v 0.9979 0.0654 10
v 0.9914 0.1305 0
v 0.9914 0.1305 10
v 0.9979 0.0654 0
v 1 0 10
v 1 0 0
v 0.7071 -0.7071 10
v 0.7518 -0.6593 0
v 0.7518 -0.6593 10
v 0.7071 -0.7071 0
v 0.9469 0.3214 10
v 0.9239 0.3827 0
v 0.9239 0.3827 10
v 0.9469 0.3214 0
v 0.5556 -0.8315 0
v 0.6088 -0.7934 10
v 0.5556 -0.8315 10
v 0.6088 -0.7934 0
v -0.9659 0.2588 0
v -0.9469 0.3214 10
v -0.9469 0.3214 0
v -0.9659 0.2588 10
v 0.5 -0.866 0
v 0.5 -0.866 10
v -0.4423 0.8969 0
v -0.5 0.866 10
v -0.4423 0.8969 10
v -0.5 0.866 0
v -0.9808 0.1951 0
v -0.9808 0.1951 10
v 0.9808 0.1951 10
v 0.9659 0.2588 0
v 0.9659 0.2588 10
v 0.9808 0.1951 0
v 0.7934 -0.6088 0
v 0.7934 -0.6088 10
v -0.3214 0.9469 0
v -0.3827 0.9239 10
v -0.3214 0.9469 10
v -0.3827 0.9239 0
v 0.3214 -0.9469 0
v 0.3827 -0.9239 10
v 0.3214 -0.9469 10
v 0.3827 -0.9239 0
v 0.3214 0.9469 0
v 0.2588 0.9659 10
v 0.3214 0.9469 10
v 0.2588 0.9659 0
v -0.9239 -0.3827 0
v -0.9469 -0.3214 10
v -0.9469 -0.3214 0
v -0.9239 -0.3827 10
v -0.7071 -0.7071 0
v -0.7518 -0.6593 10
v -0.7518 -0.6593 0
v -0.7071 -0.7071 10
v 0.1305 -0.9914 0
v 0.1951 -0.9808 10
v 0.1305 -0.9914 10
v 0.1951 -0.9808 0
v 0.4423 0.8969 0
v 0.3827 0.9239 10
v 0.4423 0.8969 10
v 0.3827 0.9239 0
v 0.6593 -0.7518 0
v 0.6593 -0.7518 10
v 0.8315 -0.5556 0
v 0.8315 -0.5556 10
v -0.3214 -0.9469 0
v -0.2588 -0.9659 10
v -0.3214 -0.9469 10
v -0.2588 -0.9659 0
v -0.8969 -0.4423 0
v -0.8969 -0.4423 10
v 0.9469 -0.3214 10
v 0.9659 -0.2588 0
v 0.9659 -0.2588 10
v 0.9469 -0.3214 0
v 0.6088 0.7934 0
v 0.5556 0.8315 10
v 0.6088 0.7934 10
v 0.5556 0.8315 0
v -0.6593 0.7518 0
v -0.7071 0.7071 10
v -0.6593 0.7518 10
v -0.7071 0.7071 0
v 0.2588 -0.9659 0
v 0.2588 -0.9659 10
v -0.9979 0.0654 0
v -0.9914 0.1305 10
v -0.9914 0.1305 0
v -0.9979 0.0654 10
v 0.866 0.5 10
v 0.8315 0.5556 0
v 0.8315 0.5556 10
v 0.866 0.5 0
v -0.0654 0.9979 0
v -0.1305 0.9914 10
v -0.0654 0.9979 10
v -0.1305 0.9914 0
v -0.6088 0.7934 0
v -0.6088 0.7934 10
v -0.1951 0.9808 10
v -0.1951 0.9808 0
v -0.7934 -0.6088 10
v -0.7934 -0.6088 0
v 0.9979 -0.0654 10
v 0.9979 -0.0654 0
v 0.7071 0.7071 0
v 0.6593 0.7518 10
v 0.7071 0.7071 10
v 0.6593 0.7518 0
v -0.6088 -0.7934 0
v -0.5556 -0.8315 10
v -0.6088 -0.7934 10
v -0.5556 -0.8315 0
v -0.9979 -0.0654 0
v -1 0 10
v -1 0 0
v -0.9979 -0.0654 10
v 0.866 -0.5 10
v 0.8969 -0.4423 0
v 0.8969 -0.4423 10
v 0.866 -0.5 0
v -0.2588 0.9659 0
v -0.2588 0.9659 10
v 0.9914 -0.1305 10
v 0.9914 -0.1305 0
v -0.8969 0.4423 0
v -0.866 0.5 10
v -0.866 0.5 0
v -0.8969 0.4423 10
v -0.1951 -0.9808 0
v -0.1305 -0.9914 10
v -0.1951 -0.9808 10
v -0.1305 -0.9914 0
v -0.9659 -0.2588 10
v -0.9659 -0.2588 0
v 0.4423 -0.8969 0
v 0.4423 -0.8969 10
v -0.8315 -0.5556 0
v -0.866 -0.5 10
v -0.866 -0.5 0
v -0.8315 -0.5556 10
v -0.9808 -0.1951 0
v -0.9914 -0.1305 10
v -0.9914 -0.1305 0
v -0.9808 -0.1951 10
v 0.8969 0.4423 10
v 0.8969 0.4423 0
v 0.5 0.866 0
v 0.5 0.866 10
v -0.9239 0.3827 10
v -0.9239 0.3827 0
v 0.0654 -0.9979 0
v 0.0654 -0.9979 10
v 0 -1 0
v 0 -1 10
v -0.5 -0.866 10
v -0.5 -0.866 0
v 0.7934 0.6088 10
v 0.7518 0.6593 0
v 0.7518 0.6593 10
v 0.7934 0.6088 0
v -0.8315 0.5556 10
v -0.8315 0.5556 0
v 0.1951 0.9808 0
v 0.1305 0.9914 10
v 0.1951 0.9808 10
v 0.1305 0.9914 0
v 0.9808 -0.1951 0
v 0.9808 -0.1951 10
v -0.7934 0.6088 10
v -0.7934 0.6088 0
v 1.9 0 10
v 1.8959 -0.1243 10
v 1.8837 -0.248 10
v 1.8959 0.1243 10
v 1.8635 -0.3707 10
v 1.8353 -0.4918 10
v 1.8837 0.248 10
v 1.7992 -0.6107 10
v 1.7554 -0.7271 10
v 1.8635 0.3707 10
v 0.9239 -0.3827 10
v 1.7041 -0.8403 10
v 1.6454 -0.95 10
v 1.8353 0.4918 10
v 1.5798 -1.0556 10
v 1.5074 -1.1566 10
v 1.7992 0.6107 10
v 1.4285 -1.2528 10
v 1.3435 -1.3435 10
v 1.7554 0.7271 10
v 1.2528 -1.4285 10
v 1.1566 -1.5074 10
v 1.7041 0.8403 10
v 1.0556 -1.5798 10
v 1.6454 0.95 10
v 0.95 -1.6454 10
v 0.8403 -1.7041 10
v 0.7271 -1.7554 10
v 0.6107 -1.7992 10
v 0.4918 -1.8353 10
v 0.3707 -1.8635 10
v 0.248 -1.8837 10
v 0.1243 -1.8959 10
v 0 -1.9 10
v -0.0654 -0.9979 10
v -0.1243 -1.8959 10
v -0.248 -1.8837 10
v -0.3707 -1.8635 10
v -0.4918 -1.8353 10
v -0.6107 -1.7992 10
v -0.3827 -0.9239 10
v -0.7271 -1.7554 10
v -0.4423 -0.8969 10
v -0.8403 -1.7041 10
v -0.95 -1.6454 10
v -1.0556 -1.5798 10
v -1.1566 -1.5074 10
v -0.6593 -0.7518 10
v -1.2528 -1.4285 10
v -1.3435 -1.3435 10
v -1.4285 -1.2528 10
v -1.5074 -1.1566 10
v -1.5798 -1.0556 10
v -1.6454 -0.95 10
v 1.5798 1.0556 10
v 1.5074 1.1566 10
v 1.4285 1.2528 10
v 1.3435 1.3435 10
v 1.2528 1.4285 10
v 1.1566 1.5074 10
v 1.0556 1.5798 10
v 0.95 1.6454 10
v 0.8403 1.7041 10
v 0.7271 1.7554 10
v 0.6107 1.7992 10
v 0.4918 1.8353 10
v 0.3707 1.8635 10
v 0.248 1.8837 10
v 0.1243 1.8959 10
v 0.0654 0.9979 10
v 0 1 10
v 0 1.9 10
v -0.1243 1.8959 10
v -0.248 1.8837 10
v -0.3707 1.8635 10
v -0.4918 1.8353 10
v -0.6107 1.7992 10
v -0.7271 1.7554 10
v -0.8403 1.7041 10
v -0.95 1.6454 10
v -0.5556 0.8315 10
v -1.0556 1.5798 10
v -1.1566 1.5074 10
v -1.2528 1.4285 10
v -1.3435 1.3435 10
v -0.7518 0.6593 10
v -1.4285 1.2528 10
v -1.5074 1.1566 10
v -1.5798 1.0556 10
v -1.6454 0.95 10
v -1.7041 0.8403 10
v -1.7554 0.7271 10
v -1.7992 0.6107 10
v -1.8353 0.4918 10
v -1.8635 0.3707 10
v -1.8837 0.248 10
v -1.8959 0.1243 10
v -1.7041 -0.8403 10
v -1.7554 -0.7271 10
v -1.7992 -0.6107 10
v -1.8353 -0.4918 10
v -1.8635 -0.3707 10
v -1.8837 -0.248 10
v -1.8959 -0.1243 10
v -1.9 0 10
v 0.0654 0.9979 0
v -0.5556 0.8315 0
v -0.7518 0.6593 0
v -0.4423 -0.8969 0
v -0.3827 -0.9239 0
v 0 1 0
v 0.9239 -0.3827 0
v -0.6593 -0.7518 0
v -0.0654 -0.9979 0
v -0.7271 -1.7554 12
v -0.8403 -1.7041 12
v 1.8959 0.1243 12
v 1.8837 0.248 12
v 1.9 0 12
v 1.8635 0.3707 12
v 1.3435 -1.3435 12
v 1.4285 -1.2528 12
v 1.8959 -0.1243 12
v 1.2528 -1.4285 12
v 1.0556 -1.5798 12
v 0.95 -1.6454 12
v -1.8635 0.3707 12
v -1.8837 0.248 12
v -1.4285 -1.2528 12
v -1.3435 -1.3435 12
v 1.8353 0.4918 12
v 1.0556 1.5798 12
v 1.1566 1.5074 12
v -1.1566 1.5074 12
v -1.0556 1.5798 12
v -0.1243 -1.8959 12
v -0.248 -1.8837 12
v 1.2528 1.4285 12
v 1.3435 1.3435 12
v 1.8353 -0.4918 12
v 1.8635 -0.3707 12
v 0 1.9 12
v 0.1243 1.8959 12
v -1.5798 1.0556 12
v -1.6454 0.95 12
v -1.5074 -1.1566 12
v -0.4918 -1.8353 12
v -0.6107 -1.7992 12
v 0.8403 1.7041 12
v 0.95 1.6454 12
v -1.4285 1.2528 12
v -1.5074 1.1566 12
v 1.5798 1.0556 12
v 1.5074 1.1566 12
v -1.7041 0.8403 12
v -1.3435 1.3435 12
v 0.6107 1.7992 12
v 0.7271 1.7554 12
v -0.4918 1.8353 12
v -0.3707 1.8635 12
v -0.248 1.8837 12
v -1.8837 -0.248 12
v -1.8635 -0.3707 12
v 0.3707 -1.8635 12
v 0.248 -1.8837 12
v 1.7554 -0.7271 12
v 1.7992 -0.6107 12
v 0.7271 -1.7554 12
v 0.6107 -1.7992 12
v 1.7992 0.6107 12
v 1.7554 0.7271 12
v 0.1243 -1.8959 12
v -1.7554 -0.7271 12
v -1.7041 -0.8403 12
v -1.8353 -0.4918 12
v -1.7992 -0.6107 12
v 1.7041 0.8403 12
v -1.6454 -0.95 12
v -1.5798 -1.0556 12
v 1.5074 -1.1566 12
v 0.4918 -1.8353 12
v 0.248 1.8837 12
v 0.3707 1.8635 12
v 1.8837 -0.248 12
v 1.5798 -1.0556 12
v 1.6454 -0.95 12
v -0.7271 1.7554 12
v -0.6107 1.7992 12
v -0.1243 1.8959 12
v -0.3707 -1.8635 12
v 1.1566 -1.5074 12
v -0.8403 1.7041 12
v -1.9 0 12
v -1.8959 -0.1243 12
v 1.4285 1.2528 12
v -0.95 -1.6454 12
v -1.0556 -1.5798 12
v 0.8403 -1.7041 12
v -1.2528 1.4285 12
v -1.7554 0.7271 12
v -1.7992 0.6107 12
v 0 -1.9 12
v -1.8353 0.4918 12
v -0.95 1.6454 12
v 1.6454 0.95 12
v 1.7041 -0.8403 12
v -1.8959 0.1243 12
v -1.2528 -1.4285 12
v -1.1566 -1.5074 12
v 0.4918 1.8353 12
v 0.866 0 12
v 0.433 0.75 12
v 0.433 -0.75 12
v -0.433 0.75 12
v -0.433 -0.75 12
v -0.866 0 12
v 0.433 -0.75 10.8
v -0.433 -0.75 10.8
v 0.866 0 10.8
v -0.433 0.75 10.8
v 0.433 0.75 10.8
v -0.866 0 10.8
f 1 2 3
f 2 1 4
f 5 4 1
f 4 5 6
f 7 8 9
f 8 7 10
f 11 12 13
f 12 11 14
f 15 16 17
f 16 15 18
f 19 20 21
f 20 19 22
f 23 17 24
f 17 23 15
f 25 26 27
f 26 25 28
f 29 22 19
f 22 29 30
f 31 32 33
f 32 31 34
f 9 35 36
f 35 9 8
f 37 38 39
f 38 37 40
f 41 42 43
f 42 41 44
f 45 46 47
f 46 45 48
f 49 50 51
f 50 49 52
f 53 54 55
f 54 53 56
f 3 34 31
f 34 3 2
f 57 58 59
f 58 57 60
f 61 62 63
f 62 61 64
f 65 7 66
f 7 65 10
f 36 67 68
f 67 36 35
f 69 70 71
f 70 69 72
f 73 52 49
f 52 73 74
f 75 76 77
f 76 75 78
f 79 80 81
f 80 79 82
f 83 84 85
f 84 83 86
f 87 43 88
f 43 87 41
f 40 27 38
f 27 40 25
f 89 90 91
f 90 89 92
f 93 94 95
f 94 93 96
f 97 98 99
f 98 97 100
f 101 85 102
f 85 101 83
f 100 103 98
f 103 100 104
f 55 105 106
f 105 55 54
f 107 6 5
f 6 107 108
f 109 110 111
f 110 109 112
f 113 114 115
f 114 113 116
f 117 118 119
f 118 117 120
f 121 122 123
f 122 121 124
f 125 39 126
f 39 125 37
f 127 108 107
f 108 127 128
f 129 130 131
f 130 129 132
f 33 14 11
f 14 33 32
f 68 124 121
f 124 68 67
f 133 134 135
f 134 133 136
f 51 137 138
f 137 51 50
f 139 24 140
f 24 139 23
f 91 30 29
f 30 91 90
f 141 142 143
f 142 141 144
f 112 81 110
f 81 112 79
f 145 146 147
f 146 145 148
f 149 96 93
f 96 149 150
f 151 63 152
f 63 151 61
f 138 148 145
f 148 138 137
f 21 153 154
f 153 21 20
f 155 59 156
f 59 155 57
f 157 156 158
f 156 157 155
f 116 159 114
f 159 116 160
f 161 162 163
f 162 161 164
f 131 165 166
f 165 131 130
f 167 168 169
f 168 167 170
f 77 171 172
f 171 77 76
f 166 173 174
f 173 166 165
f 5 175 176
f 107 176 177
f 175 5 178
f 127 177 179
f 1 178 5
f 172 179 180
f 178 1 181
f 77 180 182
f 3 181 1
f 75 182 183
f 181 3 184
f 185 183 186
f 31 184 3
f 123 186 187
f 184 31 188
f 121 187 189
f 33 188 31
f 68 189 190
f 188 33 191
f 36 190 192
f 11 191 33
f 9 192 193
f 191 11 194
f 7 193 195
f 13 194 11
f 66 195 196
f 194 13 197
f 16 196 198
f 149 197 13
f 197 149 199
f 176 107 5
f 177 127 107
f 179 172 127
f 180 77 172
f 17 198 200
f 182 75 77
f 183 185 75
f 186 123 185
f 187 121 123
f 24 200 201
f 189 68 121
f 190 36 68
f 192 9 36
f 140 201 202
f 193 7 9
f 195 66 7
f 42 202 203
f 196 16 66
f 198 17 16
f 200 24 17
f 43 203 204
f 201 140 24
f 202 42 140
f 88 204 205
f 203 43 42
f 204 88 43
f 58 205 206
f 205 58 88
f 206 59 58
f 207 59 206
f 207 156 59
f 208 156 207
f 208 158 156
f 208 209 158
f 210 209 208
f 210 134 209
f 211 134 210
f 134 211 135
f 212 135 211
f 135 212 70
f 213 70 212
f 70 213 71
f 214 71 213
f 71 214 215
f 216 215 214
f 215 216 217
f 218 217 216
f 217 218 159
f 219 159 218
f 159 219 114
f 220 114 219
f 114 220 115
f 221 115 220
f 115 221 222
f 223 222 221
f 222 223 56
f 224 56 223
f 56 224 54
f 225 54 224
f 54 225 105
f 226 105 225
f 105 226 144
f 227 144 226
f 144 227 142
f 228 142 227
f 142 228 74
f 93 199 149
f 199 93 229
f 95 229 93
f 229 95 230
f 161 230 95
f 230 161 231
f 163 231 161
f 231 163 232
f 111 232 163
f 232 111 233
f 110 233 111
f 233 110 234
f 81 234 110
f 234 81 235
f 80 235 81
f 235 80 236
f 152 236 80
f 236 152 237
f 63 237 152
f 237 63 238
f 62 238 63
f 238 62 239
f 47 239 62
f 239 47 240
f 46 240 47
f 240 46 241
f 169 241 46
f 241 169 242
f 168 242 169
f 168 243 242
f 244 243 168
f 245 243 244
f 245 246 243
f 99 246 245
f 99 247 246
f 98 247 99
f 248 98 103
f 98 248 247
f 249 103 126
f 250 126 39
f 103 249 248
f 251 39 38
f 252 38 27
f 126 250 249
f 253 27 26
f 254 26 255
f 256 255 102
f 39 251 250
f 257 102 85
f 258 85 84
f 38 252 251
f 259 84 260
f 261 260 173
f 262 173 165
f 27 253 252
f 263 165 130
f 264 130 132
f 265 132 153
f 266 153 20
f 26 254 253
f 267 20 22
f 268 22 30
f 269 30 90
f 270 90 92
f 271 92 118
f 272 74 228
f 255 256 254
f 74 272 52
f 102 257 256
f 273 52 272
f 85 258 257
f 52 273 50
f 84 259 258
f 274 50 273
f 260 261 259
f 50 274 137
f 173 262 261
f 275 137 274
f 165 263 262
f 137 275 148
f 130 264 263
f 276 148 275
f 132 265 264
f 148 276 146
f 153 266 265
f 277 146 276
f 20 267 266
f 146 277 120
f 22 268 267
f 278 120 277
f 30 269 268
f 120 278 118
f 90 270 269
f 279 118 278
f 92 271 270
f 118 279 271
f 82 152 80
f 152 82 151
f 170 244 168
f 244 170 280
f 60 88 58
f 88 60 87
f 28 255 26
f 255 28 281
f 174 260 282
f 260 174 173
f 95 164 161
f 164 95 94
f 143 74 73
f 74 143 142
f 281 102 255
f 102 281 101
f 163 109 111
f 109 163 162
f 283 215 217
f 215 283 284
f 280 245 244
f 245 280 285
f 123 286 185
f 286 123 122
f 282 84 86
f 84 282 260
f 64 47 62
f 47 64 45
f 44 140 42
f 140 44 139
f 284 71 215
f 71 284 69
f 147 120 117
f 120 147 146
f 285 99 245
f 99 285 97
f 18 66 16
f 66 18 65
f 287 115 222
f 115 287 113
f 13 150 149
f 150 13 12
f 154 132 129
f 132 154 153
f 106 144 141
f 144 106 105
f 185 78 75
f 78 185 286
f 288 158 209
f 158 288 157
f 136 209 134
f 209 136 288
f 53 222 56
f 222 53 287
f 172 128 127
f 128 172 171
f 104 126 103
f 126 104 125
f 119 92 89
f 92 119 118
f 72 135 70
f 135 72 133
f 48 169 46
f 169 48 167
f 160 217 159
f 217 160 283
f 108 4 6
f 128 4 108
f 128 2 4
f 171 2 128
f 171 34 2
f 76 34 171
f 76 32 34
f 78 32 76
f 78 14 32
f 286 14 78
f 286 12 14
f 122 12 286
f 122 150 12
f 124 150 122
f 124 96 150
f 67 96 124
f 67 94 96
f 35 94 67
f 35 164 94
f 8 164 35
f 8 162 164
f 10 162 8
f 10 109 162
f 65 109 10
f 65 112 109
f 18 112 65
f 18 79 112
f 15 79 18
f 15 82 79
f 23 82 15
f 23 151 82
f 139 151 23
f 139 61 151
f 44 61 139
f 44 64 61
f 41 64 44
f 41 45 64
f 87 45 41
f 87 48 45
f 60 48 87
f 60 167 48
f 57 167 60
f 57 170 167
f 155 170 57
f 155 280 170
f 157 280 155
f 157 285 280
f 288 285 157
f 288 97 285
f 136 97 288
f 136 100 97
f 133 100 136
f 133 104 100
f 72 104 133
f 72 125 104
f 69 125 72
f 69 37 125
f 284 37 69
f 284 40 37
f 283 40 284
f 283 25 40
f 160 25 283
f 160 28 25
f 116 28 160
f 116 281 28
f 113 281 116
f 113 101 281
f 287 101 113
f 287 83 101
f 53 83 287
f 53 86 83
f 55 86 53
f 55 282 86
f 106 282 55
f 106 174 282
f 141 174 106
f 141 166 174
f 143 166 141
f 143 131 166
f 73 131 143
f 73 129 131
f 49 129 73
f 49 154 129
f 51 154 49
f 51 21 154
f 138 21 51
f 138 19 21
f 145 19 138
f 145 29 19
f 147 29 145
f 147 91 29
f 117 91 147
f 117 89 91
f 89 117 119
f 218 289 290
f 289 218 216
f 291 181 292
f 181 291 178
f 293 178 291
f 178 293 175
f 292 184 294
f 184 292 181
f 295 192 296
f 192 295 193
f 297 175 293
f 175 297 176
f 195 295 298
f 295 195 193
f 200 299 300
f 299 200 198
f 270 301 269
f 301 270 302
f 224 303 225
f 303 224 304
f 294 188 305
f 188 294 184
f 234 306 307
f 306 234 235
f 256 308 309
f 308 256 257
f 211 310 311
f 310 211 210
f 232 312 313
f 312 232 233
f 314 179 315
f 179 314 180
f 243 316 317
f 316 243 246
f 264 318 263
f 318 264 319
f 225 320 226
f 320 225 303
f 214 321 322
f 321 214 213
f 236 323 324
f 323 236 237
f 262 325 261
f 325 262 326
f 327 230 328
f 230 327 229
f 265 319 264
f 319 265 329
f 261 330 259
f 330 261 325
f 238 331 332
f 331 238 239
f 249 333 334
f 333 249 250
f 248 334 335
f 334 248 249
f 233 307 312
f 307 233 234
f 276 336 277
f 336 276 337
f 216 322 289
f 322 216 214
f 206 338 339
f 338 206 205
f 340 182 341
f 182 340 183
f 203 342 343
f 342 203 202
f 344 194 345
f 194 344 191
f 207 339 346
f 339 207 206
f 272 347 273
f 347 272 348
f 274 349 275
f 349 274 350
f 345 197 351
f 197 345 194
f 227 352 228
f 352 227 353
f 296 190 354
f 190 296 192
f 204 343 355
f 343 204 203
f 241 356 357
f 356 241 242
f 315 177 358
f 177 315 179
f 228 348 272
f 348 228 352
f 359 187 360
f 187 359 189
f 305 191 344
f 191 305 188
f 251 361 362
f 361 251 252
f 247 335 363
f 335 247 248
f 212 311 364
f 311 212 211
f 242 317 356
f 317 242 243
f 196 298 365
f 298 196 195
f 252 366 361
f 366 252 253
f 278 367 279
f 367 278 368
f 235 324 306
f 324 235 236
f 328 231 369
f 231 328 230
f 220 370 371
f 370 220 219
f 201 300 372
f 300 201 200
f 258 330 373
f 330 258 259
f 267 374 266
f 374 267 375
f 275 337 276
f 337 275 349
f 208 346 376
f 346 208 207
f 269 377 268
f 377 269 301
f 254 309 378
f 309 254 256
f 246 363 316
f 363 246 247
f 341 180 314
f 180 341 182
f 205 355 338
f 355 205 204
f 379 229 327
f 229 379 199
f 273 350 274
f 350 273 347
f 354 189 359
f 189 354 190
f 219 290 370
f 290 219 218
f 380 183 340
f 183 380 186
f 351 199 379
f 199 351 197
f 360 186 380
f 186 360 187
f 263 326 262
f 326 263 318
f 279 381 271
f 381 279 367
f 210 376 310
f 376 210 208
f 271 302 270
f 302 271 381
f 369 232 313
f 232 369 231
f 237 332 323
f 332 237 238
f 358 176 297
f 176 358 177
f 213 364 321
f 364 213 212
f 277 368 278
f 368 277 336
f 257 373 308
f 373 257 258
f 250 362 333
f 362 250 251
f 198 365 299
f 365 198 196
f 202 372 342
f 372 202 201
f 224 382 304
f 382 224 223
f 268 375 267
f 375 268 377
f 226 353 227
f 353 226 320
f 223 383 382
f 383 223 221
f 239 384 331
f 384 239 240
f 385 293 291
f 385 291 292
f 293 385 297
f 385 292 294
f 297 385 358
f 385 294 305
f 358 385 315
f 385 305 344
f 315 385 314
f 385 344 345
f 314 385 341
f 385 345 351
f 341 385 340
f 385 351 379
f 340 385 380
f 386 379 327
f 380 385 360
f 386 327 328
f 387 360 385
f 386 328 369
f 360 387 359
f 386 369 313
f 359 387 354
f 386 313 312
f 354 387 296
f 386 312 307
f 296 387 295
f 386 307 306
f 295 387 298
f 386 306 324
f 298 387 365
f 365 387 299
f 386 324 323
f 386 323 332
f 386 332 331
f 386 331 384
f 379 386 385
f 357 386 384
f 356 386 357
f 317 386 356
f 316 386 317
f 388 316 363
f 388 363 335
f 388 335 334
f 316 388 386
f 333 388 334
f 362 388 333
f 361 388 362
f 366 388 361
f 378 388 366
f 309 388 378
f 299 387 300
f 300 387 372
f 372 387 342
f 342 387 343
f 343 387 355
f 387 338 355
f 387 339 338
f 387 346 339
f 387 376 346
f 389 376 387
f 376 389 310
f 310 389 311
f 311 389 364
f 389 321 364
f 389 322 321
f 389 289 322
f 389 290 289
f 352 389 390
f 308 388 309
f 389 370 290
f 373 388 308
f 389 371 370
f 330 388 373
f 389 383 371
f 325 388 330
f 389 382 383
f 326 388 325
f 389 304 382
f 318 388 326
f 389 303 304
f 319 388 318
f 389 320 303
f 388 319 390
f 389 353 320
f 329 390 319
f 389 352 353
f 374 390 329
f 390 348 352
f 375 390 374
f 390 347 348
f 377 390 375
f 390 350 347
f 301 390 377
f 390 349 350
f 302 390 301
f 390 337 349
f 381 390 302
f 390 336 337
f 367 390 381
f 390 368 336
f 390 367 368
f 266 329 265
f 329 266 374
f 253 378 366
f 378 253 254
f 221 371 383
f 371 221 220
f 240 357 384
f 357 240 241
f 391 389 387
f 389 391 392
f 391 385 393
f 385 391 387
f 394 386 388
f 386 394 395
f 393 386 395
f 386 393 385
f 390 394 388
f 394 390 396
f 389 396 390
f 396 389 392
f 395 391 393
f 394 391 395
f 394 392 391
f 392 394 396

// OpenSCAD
$fn = 96;

// Socket head cap screw (approximate)
// Threaded shank: 2.0 mm diameter, 10 mm long
// Head: 3.8 mm diameter, 2.0 mm tall
// Hex socket: sized approximately for M2 (1.5 mm across flats)

d_shank = 2.0;
L_shank = 10.0;

d_head  = 3.8;
h_head  = 2.0;

// Hex socket (approx.)
hex_af = 1.5;          // across flats
hex_depth = 1.2;       // socket depth
hex_corner_d = 2*hex_af/sqrt(3); // circumscribed diameter for hex

module socket_head_cap_screw() {
    difference() {
        union() {
            // Shank
            cylinder(d = d_shank, h = L_shank);

            // Head
            translate([0,0,L_shank])
                cylinder(d = d_head, h = h_head);
        }

        // Hex socket cut
        translate([0,0,L_shank + h_head - hex_depth])
            cylinder(d = hex_corner_d, h = hex_depth + 0.05, $fn = 6);
    }
}

socket_head_cap_screw();
